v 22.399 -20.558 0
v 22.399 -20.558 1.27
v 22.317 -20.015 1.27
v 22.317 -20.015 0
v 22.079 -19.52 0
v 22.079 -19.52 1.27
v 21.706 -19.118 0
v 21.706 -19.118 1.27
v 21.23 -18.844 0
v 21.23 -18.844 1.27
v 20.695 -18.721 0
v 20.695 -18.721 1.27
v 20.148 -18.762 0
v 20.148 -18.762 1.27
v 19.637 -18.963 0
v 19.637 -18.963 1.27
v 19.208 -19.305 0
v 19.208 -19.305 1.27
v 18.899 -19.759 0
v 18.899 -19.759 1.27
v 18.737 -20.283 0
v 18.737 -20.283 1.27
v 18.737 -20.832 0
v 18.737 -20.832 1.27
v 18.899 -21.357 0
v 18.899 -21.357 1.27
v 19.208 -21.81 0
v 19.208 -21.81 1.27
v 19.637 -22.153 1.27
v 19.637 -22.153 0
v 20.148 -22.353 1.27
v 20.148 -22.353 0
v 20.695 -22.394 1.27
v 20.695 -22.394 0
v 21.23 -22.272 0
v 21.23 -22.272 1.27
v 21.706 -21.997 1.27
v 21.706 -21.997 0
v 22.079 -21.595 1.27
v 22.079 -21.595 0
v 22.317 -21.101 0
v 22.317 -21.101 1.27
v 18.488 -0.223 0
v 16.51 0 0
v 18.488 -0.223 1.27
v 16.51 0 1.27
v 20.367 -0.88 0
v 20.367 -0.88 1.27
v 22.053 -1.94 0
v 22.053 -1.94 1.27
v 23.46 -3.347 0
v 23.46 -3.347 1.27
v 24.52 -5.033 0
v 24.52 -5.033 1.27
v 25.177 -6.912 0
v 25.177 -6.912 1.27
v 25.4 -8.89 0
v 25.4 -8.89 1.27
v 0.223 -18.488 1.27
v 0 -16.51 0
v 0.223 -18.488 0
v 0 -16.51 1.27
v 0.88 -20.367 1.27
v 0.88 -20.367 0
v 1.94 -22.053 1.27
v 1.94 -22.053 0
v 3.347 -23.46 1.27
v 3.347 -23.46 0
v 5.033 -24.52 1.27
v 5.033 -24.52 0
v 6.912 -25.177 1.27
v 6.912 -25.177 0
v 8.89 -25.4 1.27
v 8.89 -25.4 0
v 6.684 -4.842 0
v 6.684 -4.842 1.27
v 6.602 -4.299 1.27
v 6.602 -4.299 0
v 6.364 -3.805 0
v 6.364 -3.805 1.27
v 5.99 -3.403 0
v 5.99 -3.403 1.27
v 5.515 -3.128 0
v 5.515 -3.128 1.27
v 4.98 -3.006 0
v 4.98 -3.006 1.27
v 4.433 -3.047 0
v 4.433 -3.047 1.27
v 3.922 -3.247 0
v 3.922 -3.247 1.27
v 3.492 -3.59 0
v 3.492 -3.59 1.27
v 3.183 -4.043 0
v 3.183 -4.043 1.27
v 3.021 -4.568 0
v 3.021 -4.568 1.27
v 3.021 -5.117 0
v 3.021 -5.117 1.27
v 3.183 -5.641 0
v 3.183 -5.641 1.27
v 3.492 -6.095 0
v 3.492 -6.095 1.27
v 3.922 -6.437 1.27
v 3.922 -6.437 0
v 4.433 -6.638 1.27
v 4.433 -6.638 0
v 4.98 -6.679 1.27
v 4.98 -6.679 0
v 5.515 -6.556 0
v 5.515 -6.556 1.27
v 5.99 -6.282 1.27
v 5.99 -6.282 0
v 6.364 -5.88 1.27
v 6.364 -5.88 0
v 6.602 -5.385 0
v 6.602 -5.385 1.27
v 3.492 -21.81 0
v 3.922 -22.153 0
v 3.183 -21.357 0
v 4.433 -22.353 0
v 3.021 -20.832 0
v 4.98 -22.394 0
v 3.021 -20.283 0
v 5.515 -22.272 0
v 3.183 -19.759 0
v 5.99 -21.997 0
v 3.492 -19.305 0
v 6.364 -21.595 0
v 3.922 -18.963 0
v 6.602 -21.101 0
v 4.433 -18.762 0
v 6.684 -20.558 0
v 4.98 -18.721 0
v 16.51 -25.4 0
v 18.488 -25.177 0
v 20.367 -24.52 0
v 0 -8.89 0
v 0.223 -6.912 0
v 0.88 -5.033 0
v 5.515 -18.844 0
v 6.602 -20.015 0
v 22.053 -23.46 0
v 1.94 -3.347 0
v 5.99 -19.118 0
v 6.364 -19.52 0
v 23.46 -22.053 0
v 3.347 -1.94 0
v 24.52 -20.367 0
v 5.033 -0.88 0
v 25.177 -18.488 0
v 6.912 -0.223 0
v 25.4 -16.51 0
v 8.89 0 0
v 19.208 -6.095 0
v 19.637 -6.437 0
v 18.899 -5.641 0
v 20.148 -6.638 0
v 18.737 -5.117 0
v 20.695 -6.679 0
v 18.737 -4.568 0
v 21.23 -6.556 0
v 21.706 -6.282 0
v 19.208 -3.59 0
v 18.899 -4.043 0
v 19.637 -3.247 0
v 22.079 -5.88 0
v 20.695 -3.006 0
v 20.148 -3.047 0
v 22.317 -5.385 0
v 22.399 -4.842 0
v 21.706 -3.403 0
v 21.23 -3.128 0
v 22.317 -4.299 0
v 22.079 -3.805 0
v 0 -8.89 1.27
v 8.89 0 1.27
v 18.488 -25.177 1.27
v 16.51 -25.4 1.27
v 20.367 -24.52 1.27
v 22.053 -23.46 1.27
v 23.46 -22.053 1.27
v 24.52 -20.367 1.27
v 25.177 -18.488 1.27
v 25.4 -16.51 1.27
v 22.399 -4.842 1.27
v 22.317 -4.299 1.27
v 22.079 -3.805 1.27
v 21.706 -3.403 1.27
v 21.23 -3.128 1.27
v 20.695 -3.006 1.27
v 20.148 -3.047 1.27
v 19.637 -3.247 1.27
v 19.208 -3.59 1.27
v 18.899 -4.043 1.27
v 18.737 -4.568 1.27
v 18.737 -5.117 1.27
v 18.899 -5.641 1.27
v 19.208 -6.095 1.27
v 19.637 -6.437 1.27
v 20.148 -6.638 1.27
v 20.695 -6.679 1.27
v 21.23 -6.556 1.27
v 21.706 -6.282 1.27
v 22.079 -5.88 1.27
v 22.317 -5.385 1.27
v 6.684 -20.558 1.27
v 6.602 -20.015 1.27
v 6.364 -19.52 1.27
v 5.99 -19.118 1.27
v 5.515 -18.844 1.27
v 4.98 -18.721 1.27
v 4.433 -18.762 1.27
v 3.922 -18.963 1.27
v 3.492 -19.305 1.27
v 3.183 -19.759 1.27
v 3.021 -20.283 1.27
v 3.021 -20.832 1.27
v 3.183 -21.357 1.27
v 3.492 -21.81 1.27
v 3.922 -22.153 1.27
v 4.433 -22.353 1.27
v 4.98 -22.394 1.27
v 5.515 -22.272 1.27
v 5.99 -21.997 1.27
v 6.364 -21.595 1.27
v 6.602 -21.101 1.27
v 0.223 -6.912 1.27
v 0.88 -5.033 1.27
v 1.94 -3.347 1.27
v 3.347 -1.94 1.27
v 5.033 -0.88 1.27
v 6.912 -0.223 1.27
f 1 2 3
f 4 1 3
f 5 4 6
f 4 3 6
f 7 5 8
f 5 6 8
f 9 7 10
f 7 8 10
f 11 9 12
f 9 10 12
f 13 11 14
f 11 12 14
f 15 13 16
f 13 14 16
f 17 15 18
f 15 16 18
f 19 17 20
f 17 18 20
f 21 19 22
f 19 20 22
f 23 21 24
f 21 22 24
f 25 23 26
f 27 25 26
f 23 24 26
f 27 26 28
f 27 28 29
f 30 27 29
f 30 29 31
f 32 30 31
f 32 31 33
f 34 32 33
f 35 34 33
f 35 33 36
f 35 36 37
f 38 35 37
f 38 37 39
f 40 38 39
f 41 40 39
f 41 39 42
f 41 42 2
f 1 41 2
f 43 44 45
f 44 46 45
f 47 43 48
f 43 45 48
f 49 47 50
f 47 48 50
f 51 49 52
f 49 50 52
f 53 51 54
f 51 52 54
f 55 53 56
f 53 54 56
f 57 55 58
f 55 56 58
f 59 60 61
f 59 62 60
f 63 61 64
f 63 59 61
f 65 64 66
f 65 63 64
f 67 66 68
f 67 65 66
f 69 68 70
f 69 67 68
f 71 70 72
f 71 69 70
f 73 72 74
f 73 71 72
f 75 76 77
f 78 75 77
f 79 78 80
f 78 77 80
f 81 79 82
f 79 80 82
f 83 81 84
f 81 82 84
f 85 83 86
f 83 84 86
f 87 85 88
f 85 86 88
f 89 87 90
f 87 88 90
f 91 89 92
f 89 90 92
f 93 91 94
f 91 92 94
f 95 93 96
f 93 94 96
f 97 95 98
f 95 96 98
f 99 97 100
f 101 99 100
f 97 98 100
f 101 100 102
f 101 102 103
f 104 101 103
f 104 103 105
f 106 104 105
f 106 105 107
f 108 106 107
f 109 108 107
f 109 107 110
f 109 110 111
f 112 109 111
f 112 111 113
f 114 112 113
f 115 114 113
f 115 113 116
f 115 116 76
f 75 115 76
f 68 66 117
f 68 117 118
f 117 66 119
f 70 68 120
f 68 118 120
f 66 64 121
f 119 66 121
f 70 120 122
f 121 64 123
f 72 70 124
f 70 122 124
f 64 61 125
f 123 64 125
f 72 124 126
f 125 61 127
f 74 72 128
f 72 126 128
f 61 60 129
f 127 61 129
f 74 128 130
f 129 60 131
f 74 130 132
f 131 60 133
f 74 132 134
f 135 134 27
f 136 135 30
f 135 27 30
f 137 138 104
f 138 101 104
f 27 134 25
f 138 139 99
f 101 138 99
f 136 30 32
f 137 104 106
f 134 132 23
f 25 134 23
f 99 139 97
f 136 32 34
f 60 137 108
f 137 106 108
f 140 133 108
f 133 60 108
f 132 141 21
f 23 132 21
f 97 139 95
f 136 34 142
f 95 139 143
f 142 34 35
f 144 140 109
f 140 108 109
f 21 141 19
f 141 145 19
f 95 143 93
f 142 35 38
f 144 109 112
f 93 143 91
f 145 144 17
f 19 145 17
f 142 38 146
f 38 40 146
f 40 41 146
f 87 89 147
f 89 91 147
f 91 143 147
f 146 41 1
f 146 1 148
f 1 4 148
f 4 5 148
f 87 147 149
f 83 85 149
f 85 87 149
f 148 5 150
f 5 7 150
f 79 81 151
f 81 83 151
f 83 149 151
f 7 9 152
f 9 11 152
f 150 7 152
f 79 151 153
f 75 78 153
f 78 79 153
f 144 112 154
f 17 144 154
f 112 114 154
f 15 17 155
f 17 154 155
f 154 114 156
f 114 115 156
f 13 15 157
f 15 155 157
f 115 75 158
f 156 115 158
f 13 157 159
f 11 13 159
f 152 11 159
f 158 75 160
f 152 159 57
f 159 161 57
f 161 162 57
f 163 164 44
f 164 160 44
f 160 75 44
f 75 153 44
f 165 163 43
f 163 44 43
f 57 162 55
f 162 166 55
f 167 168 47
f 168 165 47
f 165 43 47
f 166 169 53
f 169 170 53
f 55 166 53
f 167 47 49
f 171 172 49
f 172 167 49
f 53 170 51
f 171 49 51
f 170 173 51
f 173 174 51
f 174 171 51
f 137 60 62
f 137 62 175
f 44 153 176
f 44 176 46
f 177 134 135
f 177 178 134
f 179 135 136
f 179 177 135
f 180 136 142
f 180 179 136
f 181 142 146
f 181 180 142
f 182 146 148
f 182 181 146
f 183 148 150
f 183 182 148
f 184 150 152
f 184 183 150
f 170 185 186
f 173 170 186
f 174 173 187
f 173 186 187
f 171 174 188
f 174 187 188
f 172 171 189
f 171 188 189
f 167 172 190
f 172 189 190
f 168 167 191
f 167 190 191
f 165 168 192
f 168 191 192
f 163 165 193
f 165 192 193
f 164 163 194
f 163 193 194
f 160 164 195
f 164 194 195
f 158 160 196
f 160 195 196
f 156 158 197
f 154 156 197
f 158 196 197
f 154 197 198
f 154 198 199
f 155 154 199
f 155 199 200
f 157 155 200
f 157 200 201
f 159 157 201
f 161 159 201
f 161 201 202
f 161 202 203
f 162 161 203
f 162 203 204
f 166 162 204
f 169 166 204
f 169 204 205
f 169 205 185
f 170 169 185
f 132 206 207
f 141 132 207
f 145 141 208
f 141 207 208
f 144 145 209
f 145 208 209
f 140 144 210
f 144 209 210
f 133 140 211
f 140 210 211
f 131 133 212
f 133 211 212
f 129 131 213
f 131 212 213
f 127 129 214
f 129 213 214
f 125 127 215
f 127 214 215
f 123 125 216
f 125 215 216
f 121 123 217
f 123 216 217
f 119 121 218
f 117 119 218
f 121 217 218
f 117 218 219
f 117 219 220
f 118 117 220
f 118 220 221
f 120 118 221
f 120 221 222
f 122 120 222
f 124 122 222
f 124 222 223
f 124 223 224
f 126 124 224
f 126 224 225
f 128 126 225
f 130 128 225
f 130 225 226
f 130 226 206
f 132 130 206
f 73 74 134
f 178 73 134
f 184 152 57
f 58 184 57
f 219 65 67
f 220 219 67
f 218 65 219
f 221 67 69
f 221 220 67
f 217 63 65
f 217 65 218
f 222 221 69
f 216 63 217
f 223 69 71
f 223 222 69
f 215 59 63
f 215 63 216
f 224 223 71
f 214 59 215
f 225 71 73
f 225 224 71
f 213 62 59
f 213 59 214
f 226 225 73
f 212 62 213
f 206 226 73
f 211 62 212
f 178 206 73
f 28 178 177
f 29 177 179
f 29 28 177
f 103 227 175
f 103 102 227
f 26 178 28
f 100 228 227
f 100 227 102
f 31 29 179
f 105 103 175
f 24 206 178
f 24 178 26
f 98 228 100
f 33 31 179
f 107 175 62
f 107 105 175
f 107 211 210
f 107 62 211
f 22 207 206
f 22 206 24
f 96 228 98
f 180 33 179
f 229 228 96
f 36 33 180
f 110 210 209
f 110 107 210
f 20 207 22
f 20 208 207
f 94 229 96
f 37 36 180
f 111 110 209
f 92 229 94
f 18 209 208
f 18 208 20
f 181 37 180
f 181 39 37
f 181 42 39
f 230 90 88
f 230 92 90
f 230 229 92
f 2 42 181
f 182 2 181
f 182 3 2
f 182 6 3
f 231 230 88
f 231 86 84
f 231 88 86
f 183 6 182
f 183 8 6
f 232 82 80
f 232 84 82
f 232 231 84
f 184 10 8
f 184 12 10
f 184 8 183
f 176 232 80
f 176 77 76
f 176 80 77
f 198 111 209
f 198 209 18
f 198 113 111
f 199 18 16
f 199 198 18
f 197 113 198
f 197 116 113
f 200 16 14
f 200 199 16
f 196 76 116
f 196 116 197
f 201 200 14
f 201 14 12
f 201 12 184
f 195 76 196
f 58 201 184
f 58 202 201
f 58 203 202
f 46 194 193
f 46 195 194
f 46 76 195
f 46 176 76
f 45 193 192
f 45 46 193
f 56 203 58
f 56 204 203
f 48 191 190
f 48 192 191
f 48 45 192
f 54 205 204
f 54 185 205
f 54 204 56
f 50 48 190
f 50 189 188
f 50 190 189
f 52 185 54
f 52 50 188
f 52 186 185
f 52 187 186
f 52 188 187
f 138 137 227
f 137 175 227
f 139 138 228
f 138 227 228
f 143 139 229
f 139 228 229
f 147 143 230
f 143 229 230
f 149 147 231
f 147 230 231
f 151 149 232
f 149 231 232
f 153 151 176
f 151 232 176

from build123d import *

# Parameters (mm, degrees)
SKETCH1_W                      = 25.4
SKETCH1_H                      = 25.4
BOSS_EXTRUDE1_DEPTH            = 1.27
MOUNTING_HOLES_FOR_MOTOR_REACH = 37.943
SKETCH8_R                      = 1.8415
FILLET2_R                      = 8.89


with BuildPart() as part:
    # Sketch1 → Boss-Extrude1 (new body)
    with BuildSketch(Plane.XY):
        with Locations((12.7, -12.7)):
            Rectangle(SKETCH1_W, SKETCH1_H)
    extrude(amount=BOSS_EXTRUDE1_DEPTH)

    # Sketch8 → Mounting Holes for Motor (cut, up to next)
    with BuildSketch(Plane.XY.offset(1.27), mode=Mode.PRIVATE) as mounting_holes_for_motor_sk1:
        with Locations((20.557724106, -4.842275894)):
            Circle(SKETCH8_R)
    mounting_holes_for_motor_tool1 = extrude(mounting_holes_for_motor_sk1.sketch, amount=-MOUNTING_HOLES_FOR_MOTOR_REACH, mode=Mode.PRIVATE) & part.part
    # Sketch8 → Mounting Holes for Motor (cut, up to next)
    with BuildSketch(Plane.XY.offset(1.27), mode=Mode.PRIVATE) as mounting_holes_for_motor_sk2:
        with Locations((4.842275894, -4.842275894)):
            Circle(SKETCH8_R)
    mounting_holes_for_motor_tool2 = extrude(mounting_holes_for_motor_sk2.sketch, amount=-MOUNTING_HOLES_FOR_MOTOR_REACH, mode=Mode.PRIVATE) & part.part
    # Sketch8 → Mounting Holes for Motor (cut, up to next)
    with BuildSketch(Plane.XY.offset(1.27), mode=Mode.PRIVATE) as mounting_holes_for_motor_sk3:
        with Locations((4.842275894, -20.557724106)):
            Circle(SKETCH8_R)
    mounting_holes_for_motor_tool3 = extrude(mounting_holes_for_motor_sk3.sketch, amount=-MOUNTING_HOLES_FOR_MOTOR_REACH, mode=Mode.PRIVATE) & part.part
    # Sketch8 → Mounting Holes for Motor (cut, up to next)
    with BuildSketch(Plane.XY.offset(1.27), mode=Mode.PRIVATE) as mounting_holes_for_motor_sk4:
        with Locations((20.557724106, -20.557724106)):
            Circle(SKETCH8_R)
    mounting_holes_for_motor_tool4 = extrude(mounting_holes_for_motor_sk4.sketch, amount=-MOUNTING_HOLES_FOR_MOTOR_REACH, mode=Mode.PRIVATE) & part.part
    add(mounting_holes_for_motor_tool1.solids().sort_by_distance((20.557724, -4.842276, 1.27))[0], mode=Mode.SUBTRACT)
    add(mounting_holes_for_motor_tool2.solids().sort_by_distance((4.842276, -4.842276, 1.27))[0], mode=Mode.SUBTRACT)
    add(mounting_holes_for_motor_tool3.solids().sort_by_distance((4.842276, -20.557724, 1.27))[0], mode=Mode.SUBTRACT)
    add(mounting_holes_for_motor_tool4.solids().sort_by_distance((20.557724, -20.557724, 1.27))[0], mode=Mode.SUBTRACT)

    # Fillet2
    fillet2_edges = [part.edges().sort_by_distance(p)[0] for p in [
        (0, 0, 0.635),
        (25.4, 0, 0.635),
        (25.4, -25.4, 0.635),
        (0, -25.4, 0.635),
    ]]
    fillet(fillet2_edges, radius=FILLET2_R)


solid = part.part
